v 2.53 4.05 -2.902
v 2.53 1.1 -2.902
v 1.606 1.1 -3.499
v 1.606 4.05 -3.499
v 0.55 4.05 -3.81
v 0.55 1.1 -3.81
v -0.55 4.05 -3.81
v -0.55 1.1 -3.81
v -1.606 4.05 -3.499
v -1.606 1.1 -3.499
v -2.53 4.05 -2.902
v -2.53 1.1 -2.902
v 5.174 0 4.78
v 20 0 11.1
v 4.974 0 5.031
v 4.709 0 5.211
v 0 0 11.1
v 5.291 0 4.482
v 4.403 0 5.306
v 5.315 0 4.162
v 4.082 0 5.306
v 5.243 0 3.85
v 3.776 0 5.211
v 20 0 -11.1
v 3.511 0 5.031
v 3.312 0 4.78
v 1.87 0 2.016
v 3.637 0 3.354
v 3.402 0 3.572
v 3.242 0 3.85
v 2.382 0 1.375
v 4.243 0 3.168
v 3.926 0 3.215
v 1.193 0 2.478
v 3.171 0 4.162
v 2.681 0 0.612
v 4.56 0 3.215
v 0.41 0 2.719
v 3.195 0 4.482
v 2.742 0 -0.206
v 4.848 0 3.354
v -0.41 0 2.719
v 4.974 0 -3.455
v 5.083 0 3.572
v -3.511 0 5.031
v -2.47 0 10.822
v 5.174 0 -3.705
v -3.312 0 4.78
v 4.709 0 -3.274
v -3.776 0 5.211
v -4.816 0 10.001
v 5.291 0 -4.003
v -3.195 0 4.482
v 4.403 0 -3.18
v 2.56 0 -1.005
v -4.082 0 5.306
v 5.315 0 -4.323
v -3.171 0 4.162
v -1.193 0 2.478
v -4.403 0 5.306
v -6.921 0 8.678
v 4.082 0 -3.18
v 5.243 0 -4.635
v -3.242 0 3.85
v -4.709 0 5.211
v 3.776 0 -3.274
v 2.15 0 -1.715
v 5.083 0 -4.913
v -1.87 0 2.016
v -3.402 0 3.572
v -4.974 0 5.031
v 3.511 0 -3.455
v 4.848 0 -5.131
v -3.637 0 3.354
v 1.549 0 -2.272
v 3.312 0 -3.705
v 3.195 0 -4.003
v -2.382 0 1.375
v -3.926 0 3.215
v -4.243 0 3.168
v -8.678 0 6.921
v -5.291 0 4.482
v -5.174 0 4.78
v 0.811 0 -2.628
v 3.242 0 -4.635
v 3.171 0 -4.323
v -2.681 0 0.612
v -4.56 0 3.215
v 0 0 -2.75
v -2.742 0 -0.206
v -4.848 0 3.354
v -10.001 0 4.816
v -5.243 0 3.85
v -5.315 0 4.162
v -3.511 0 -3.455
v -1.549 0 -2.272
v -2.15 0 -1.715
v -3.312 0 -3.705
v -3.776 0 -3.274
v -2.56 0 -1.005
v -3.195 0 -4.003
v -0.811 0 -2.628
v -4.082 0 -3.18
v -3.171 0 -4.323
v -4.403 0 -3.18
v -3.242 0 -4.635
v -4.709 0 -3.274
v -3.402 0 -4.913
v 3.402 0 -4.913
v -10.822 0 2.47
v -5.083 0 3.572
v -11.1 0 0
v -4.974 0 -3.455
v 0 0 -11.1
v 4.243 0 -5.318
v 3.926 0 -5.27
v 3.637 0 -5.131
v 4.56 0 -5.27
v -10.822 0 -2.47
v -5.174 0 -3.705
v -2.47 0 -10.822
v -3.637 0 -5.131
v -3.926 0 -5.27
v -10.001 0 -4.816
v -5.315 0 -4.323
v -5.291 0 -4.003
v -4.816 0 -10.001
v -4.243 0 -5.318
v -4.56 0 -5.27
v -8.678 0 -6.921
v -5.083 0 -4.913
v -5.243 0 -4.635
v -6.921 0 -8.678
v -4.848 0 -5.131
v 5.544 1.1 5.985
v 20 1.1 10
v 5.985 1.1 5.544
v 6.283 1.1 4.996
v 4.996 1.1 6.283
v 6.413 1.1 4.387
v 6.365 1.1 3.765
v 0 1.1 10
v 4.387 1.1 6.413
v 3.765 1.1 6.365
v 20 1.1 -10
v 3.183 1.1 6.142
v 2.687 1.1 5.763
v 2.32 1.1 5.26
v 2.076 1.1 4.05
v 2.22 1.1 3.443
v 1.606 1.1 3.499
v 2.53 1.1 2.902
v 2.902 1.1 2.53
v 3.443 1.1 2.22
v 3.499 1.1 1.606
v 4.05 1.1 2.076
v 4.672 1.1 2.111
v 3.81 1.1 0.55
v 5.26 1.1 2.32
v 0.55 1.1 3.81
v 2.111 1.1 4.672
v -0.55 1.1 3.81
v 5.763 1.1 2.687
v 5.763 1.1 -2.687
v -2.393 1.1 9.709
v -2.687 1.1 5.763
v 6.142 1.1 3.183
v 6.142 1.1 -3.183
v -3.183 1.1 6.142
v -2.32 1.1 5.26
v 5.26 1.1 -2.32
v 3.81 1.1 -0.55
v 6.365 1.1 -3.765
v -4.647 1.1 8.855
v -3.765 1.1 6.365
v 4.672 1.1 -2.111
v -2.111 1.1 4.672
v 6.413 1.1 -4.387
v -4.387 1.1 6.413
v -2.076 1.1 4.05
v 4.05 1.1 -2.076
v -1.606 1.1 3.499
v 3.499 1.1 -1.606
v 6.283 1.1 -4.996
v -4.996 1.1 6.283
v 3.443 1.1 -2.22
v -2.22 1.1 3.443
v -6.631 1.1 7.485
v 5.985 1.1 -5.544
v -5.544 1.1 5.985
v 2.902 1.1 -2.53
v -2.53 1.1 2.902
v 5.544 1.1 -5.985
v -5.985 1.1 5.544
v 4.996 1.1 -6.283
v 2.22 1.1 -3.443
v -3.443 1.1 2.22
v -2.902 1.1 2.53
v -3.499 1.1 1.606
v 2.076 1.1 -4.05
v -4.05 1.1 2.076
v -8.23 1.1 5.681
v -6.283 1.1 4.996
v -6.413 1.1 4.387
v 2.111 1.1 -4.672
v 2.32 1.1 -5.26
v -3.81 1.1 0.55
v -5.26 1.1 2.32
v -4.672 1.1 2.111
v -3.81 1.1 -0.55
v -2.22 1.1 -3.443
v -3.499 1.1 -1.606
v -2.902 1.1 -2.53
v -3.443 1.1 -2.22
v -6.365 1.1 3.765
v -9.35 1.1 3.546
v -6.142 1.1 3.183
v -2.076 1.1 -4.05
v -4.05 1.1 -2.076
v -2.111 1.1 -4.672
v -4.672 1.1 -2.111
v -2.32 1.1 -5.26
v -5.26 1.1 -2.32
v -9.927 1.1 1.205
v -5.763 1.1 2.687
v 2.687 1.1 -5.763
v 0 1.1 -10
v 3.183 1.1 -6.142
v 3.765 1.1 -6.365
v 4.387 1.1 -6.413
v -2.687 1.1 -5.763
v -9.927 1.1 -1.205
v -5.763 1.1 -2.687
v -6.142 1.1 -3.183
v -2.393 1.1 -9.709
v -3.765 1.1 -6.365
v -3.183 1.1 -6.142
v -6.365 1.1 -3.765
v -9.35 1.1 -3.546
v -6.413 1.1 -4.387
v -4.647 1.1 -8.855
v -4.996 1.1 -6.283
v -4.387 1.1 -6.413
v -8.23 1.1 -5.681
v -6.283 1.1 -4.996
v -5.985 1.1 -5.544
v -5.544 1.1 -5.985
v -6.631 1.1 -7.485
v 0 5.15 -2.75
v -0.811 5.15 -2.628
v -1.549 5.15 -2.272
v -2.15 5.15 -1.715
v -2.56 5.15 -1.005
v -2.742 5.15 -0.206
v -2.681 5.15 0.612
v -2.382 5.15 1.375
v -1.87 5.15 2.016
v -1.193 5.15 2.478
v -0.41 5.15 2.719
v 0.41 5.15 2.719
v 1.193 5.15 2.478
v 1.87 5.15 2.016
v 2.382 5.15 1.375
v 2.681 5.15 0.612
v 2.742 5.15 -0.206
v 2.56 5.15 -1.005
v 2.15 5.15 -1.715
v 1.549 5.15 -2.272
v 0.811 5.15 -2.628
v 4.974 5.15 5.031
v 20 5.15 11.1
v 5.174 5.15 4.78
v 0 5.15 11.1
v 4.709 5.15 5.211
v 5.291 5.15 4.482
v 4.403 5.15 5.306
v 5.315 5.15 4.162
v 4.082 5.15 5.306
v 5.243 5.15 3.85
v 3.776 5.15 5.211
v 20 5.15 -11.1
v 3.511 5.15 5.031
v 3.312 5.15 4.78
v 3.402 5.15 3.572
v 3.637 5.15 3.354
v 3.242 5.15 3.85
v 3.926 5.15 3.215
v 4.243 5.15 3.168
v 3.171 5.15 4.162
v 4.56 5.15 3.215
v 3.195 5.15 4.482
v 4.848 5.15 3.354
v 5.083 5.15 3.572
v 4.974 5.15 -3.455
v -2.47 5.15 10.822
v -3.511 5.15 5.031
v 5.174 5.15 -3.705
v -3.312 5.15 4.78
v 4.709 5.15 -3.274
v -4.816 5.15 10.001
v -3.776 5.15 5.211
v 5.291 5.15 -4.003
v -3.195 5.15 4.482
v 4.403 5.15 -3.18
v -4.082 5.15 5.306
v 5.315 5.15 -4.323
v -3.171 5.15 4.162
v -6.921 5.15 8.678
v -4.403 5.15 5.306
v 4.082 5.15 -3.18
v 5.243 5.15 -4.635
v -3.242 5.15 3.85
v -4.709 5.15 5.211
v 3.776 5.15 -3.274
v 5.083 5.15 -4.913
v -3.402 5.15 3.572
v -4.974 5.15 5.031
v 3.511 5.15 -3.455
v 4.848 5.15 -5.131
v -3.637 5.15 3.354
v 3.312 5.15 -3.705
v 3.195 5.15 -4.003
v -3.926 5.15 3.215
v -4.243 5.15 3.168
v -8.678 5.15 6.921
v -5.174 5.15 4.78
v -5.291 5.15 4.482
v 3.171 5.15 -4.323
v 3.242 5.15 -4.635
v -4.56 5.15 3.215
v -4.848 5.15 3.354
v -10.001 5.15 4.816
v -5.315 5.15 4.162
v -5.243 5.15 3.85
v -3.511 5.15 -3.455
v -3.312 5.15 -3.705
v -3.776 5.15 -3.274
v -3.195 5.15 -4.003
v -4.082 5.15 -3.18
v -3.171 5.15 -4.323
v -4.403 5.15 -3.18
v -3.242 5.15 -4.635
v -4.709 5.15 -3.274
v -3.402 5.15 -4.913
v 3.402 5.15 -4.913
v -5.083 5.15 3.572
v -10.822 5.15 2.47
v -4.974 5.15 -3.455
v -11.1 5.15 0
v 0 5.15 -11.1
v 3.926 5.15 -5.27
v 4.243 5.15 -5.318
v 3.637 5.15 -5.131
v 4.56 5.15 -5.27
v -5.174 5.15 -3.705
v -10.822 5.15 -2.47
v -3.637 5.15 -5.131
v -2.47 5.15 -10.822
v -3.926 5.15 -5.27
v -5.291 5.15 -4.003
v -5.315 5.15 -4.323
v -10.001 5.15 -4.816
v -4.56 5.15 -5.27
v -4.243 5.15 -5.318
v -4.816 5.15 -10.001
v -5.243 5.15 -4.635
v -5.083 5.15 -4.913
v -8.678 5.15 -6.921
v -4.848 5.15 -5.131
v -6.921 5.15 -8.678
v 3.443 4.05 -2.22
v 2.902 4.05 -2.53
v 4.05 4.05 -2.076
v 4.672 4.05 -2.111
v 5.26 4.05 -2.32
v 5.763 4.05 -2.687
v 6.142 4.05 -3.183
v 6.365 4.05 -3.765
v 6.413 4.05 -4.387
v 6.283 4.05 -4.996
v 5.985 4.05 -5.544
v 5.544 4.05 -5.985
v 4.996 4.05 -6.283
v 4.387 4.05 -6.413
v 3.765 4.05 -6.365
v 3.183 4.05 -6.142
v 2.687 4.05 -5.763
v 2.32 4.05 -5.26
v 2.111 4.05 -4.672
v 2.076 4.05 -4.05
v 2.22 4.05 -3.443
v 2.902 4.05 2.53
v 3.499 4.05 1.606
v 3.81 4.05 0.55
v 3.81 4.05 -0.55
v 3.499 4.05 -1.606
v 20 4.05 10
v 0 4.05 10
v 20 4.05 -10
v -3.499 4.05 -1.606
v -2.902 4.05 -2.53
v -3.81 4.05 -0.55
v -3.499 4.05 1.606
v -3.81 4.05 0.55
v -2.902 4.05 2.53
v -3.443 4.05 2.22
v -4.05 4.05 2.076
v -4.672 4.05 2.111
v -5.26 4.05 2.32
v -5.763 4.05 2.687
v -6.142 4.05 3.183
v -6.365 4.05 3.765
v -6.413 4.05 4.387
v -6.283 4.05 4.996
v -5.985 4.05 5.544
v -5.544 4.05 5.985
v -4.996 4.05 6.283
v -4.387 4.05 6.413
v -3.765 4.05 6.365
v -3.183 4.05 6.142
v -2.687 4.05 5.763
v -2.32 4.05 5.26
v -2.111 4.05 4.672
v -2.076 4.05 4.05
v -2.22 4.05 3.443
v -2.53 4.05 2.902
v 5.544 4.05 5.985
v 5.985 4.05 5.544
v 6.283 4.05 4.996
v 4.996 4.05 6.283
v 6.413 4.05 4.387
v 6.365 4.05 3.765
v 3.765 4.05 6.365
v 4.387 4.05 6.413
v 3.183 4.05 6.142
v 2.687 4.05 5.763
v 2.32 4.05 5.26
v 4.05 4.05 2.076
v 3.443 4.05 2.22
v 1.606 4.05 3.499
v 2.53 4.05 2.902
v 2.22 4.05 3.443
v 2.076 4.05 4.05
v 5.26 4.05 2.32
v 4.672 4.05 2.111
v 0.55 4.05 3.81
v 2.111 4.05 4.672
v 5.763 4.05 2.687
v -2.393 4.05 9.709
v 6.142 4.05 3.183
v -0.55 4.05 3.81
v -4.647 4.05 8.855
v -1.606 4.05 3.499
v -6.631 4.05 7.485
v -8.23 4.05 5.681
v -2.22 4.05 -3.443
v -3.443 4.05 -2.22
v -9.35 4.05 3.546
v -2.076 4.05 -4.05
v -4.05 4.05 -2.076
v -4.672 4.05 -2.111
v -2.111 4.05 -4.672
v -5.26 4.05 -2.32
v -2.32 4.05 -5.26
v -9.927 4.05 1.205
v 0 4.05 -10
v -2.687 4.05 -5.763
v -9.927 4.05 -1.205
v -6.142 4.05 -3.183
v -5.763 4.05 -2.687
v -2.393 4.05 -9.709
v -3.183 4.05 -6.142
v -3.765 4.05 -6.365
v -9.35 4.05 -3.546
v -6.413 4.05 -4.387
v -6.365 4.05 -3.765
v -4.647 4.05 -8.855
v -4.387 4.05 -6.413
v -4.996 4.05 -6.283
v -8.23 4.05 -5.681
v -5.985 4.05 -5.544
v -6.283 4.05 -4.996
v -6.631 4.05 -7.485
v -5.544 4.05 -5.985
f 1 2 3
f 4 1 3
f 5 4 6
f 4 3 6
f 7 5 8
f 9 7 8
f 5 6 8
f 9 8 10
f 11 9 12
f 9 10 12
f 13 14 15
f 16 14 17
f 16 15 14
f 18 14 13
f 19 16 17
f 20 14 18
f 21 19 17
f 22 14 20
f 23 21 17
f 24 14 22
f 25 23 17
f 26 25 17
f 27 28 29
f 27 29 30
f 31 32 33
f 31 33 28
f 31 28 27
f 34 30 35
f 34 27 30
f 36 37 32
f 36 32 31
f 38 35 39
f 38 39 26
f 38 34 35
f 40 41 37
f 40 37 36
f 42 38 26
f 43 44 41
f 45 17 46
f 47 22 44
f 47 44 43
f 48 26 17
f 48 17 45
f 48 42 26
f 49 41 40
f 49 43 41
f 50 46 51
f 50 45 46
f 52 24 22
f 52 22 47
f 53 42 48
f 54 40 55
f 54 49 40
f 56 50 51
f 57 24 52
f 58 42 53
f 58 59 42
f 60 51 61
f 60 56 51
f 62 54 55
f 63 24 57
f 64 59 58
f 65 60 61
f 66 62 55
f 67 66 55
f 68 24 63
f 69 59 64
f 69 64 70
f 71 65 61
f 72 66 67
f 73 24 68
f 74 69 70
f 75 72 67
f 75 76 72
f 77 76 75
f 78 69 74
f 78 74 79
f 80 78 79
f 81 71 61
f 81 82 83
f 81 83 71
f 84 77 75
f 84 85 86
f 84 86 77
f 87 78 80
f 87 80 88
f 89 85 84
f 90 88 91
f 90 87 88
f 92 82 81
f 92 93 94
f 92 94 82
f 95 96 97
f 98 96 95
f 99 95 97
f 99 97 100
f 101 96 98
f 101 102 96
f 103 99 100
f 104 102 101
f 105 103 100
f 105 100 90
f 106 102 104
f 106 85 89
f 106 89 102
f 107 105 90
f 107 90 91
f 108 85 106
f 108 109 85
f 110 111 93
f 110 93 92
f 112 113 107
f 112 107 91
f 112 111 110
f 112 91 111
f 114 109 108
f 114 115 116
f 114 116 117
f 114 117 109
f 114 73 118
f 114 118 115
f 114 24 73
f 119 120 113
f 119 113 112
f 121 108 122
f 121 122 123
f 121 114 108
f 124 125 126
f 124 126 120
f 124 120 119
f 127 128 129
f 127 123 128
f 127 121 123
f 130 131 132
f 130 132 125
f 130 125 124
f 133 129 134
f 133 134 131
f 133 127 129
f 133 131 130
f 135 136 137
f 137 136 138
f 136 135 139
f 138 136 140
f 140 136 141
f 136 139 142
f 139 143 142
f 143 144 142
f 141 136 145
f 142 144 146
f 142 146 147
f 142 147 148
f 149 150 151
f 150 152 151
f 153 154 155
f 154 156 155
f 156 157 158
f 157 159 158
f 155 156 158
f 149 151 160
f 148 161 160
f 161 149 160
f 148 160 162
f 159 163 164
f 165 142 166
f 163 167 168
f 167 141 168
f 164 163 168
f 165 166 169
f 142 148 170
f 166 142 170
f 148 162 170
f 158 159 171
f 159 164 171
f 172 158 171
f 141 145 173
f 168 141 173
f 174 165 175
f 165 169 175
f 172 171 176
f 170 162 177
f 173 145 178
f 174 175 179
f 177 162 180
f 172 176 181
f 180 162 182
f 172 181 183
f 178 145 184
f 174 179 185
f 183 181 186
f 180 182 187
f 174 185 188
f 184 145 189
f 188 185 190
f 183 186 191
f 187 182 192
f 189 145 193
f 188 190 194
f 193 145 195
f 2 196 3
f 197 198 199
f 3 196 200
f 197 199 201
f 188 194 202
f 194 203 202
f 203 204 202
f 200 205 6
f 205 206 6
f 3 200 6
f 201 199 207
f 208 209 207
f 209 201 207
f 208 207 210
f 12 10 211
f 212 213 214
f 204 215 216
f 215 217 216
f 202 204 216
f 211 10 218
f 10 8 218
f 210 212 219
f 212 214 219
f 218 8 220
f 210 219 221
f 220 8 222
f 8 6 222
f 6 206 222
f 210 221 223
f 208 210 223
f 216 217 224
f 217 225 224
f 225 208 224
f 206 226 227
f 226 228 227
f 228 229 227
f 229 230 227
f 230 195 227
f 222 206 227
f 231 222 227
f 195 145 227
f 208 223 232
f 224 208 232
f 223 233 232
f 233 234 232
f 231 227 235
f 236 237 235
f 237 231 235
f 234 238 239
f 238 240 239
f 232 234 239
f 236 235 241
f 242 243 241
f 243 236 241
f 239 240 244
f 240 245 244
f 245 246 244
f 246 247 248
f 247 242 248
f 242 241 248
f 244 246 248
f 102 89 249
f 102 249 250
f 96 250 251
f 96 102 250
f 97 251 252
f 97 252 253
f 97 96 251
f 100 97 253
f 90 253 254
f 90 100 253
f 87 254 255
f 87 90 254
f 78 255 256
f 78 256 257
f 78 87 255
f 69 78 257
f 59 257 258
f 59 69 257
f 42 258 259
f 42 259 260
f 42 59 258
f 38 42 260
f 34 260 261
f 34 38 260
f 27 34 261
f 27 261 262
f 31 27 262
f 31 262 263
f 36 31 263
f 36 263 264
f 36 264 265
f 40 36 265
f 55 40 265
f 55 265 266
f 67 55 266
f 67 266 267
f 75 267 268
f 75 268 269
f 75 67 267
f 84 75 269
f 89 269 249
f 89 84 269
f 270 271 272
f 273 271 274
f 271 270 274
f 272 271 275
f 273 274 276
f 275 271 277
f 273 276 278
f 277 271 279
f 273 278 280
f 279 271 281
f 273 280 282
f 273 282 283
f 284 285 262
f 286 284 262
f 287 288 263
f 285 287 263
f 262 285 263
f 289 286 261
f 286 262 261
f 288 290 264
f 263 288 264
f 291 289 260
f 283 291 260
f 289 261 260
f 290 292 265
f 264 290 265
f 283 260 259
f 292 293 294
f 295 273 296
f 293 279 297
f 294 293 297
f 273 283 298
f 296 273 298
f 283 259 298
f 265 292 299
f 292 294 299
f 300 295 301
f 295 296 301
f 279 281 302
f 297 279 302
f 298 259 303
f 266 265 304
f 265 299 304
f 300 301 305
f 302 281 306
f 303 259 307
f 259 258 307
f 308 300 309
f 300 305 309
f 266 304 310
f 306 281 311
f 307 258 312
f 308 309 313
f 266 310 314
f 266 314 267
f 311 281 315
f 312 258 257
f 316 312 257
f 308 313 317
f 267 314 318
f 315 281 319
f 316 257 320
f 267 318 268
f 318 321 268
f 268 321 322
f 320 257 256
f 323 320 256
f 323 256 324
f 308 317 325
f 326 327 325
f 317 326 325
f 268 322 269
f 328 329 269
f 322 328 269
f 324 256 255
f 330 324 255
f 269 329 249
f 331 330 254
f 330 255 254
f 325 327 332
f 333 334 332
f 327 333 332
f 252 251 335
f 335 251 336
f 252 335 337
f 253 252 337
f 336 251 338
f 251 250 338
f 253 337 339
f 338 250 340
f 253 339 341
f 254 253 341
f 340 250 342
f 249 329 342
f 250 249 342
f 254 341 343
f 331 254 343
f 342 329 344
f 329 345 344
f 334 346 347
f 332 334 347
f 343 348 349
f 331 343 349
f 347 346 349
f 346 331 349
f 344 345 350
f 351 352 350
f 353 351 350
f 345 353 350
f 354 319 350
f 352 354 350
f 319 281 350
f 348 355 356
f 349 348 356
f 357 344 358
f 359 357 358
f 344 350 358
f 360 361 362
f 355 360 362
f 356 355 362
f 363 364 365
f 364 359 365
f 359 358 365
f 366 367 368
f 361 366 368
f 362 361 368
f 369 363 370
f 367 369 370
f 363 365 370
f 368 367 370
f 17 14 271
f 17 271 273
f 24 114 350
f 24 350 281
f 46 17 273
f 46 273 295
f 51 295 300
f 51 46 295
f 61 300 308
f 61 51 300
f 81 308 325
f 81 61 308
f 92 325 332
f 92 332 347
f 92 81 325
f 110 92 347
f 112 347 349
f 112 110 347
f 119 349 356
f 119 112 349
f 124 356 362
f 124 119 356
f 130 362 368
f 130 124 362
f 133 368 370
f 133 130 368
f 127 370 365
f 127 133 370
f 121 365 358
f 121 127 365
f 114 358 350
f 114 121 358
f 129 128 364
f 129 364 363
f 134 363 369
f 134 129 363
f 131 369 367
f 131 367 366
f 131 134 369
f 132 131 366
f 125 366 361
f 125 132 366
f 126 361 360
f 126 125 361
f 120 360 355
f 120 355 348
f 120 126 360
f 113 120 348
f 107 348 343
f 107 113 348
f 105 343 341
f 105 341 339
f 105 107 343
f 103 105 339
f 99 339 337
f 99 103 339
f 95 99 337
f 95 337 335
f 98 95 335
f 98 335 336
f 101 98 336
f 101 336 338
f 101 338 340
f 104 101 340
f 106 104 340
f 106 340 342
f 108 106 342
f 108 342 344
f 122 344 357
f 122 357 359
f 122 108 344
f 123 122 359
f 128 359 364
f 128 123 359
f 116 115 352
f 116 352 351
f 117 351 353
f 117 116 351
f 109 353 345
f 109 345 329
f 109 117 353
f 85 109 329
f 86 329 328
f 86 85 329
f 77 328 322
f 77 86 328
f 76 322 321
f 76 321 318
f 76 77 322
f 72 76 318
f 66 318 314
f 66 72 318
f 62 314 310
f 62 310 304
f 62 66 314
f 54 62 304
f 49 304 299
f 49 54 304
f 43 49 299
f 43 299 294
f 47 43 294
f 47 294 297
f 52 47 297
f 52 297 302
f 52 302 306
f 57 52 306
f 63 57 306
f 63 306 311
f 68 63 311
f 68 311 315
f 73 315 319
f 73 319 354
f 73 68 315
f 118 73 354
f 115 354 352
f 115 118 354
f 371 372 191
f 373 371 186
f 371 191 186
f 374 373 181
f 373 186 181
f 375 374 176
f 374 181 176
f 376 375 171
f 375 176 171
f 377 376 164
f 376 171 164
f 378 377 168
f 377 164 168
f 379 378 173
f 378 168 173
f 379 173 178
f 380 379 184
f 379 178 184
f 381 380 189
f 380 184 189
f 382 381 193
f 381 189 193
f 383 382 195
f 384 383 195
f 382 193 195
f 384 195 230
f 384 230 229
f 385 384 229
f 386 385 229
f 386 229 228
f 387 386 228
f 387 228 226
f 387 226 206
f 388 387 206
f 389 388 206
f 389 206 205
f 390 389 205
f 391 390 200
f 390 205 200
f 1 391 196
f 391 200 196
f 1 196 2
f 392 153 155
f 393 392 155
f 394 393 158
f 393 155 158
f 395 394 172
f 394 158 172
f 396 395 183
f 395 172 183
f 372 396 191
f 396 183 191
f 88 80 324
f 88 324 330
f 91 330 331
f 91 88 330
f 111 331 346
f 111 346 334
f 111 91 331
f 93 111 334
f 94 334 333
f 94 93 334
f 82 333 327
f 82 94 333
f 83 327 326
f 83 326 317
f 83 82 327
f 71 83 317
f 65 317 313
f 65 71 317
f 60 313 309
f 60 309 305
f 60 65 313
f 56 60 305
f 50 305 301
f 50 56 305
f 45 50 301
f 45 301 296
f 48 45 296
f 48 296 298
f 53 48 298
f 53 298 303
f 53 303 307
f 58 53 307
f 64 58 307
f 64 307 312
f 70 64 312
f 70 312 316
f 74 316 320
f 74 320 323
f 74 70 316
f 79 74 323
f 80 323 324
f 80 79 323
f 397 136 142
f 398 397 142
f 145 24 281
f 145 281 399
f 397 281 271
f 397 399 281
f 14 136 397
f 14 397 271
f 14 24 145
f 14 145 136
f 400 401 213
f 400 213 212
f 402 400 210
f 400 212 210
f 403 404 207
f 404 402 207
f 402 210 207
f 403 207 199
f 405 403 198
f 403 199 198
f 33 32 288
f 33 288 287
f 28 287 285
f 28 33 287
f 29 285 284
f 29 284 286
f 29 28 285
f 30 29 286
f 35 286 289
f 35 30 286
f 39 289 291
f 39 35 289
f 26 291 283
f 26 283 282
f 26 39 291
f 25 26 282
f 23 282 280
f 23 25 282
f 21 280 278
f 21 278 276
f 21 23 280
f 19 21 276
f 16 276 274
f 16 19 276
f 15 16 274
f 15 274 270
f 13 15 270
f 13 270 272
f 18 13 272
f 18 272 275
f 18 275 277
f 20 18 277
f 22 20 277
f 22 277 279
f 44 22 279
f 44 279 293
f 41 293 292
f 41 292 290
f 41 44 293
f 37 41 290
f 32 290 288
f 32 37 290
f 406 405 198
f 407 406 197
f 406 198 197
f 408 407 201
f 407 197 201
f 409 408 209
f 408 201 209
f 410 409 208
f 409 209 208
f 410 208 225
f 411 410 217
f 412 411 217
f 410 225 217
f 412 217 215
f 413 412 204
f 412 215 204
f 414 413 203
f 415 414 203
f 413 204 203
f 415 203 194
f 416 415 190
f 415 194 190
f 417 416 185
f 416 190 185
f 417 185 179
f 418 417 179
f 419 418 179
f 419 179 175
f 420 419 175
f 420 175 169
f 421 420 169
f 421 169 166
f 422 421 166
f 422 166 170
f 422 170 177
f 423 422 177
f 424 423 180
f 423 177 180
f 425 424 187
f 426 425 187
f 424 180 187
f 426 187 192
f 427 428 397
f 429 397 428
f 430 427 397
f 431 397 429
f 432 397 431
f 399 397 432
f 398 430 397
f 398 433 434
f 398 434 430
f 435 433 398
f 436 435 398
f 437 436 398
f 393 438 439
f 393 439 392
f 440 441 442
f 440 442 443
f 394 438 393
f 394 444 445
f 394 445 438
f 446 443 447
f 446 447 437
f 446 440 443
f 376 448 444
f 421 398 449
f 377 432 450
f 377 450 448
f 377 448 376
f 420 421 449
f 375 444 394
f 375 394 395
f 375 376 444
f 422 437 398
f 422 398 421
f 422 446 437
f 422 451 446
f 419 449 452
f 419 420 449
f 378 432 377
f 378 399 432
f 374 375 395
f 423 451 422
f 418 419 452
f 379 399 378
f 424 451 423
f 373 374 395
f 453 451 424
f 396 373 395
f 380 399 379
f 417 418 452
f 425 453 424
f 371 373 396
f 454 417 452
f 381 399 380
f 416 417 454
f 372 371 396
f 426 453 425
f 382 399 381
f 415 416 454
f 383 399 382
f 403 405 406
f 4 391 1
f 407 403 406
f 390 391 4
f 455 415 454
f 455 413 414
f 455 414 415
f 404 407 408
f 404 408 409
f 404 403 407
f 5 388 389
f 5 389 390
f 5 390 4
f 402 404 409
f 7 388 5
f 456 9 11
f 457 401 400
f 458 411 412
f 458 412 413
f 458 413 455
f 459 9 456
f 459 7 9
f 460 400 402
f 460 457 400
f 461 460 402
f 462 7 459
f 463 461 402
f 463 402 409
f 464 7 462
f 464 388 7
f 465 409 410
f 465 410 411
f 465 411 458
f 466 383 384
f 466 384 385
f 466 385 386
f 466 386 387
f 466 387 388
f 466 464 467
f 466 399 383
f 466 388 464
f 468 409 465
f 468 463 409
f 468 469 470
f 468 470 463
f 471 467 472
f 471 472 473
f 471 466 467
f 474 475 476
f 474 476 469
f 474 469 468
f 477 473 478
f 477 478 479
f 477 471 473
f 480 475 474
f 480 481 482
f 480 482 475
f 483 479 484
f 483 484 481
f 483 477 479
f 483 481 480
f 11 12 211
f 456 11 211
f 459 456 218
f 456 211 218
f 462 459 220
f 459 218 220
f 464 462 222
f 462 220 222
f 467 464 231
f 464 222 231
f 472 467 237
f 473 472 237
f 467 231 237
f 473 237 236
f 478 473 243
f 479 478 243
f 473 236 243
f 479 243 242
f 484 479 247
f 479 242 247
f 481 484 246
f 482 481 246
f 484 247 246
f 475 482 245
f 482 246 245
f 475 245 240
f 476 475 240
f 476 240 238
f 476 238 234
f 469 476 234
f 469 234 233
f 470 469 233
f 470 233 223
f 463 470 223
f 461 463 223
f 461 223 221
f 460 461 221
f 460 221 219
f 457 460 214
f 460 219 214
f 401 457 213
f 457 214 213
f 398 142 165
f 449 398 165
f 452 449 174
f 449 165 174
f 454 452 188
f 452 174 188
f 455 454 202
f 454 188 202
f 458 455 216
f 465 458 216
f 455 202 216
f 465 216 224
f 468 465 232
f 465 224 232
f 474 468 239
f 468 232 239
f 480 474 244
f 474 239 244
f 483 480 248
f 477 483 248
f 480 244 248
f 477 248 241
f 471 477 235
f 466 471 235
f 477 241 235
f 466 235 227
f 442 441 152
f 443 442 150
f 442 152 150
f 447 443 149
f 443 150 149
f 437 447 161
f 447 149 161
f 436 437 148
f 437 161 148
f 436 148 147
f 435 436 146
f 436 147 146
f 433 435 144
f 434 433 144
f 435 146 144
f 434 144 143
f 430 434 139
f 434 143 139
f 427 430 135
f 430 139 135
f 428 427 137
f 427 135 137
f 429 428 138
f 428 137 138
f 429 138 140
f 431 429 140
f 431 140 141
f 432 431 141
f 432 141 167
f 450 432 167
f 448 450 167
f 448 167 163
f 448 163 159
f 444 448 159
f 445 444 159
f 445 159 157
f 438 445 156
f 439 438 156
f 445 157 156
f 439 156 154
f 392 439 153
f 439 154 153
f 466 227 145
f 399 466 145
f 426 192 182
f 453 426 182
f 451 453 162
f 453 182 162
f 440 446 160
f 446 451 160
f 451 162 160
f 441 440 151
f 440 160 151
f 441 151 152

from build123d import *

# Parameters (mm, degrees)
SKETCH2_R           = 1.075
SKETCH2_R_2         = 2.75
BOSS_EXTRUDE1_DEPTH = 5.15
SHELL1_T            = -1.1


with BuildPart() as part:
    # Sketch2 → Boss-Extrude1 (new body)
    with BuildSketch(Plane(origin=(0, 0, 0), x_dir=(1, 0, 0), z_dir=(0, 1, 0))):
        with BuildLine():
            Line((0, 11.1), (20, 11.1))
            Line((20, 11.1), (20, -11.1))
            Line((20, -11.1), (0, -11.1))
            ThreePointArc((0, -11.1), (-11.1, 0), (0, 11.1))
        make_face()
        with Locations(Location((-4.242640687, 4.242640687, 0), (0, 0, 90))):
            Circle(SKETCH2_R, mode=Mode.SUBTRACT)
        with Locations(Location((4.242640687, 4.242640687, 0), (0, 0, 90))):
            Circle(SKETCH2_R, mode=Mode.SUBTRACT)
        with Locations(Location((-4.242640687, -4.242640687, 0), (0, 0, 90))):
            Circle(SKETCH2_R, mode=Mode.SUBTRACT)
        with Locations(Location((4.242640687, -4.242640687, 0), (0, 0, 90))):
            Circle(SKETCH2_R, mode=Mode.SUBTRACT)
        with Locations(Location((0, 0, 0), (0, 0, 90))):
            Circle(SKETCH2_R_2, mode=Mode.SUBTRACT)
    extrude(amount=BOSS_EXTRUDE1_DEPTH)

    # Shell1
    shell1_openings = [part.faces().sort_by_distance(p)[0] for p in [
        (20, 2.575, 0),
    ]]
    offset(amount=SHELL1_T, openings=shell1_openings)


solid = part.part
